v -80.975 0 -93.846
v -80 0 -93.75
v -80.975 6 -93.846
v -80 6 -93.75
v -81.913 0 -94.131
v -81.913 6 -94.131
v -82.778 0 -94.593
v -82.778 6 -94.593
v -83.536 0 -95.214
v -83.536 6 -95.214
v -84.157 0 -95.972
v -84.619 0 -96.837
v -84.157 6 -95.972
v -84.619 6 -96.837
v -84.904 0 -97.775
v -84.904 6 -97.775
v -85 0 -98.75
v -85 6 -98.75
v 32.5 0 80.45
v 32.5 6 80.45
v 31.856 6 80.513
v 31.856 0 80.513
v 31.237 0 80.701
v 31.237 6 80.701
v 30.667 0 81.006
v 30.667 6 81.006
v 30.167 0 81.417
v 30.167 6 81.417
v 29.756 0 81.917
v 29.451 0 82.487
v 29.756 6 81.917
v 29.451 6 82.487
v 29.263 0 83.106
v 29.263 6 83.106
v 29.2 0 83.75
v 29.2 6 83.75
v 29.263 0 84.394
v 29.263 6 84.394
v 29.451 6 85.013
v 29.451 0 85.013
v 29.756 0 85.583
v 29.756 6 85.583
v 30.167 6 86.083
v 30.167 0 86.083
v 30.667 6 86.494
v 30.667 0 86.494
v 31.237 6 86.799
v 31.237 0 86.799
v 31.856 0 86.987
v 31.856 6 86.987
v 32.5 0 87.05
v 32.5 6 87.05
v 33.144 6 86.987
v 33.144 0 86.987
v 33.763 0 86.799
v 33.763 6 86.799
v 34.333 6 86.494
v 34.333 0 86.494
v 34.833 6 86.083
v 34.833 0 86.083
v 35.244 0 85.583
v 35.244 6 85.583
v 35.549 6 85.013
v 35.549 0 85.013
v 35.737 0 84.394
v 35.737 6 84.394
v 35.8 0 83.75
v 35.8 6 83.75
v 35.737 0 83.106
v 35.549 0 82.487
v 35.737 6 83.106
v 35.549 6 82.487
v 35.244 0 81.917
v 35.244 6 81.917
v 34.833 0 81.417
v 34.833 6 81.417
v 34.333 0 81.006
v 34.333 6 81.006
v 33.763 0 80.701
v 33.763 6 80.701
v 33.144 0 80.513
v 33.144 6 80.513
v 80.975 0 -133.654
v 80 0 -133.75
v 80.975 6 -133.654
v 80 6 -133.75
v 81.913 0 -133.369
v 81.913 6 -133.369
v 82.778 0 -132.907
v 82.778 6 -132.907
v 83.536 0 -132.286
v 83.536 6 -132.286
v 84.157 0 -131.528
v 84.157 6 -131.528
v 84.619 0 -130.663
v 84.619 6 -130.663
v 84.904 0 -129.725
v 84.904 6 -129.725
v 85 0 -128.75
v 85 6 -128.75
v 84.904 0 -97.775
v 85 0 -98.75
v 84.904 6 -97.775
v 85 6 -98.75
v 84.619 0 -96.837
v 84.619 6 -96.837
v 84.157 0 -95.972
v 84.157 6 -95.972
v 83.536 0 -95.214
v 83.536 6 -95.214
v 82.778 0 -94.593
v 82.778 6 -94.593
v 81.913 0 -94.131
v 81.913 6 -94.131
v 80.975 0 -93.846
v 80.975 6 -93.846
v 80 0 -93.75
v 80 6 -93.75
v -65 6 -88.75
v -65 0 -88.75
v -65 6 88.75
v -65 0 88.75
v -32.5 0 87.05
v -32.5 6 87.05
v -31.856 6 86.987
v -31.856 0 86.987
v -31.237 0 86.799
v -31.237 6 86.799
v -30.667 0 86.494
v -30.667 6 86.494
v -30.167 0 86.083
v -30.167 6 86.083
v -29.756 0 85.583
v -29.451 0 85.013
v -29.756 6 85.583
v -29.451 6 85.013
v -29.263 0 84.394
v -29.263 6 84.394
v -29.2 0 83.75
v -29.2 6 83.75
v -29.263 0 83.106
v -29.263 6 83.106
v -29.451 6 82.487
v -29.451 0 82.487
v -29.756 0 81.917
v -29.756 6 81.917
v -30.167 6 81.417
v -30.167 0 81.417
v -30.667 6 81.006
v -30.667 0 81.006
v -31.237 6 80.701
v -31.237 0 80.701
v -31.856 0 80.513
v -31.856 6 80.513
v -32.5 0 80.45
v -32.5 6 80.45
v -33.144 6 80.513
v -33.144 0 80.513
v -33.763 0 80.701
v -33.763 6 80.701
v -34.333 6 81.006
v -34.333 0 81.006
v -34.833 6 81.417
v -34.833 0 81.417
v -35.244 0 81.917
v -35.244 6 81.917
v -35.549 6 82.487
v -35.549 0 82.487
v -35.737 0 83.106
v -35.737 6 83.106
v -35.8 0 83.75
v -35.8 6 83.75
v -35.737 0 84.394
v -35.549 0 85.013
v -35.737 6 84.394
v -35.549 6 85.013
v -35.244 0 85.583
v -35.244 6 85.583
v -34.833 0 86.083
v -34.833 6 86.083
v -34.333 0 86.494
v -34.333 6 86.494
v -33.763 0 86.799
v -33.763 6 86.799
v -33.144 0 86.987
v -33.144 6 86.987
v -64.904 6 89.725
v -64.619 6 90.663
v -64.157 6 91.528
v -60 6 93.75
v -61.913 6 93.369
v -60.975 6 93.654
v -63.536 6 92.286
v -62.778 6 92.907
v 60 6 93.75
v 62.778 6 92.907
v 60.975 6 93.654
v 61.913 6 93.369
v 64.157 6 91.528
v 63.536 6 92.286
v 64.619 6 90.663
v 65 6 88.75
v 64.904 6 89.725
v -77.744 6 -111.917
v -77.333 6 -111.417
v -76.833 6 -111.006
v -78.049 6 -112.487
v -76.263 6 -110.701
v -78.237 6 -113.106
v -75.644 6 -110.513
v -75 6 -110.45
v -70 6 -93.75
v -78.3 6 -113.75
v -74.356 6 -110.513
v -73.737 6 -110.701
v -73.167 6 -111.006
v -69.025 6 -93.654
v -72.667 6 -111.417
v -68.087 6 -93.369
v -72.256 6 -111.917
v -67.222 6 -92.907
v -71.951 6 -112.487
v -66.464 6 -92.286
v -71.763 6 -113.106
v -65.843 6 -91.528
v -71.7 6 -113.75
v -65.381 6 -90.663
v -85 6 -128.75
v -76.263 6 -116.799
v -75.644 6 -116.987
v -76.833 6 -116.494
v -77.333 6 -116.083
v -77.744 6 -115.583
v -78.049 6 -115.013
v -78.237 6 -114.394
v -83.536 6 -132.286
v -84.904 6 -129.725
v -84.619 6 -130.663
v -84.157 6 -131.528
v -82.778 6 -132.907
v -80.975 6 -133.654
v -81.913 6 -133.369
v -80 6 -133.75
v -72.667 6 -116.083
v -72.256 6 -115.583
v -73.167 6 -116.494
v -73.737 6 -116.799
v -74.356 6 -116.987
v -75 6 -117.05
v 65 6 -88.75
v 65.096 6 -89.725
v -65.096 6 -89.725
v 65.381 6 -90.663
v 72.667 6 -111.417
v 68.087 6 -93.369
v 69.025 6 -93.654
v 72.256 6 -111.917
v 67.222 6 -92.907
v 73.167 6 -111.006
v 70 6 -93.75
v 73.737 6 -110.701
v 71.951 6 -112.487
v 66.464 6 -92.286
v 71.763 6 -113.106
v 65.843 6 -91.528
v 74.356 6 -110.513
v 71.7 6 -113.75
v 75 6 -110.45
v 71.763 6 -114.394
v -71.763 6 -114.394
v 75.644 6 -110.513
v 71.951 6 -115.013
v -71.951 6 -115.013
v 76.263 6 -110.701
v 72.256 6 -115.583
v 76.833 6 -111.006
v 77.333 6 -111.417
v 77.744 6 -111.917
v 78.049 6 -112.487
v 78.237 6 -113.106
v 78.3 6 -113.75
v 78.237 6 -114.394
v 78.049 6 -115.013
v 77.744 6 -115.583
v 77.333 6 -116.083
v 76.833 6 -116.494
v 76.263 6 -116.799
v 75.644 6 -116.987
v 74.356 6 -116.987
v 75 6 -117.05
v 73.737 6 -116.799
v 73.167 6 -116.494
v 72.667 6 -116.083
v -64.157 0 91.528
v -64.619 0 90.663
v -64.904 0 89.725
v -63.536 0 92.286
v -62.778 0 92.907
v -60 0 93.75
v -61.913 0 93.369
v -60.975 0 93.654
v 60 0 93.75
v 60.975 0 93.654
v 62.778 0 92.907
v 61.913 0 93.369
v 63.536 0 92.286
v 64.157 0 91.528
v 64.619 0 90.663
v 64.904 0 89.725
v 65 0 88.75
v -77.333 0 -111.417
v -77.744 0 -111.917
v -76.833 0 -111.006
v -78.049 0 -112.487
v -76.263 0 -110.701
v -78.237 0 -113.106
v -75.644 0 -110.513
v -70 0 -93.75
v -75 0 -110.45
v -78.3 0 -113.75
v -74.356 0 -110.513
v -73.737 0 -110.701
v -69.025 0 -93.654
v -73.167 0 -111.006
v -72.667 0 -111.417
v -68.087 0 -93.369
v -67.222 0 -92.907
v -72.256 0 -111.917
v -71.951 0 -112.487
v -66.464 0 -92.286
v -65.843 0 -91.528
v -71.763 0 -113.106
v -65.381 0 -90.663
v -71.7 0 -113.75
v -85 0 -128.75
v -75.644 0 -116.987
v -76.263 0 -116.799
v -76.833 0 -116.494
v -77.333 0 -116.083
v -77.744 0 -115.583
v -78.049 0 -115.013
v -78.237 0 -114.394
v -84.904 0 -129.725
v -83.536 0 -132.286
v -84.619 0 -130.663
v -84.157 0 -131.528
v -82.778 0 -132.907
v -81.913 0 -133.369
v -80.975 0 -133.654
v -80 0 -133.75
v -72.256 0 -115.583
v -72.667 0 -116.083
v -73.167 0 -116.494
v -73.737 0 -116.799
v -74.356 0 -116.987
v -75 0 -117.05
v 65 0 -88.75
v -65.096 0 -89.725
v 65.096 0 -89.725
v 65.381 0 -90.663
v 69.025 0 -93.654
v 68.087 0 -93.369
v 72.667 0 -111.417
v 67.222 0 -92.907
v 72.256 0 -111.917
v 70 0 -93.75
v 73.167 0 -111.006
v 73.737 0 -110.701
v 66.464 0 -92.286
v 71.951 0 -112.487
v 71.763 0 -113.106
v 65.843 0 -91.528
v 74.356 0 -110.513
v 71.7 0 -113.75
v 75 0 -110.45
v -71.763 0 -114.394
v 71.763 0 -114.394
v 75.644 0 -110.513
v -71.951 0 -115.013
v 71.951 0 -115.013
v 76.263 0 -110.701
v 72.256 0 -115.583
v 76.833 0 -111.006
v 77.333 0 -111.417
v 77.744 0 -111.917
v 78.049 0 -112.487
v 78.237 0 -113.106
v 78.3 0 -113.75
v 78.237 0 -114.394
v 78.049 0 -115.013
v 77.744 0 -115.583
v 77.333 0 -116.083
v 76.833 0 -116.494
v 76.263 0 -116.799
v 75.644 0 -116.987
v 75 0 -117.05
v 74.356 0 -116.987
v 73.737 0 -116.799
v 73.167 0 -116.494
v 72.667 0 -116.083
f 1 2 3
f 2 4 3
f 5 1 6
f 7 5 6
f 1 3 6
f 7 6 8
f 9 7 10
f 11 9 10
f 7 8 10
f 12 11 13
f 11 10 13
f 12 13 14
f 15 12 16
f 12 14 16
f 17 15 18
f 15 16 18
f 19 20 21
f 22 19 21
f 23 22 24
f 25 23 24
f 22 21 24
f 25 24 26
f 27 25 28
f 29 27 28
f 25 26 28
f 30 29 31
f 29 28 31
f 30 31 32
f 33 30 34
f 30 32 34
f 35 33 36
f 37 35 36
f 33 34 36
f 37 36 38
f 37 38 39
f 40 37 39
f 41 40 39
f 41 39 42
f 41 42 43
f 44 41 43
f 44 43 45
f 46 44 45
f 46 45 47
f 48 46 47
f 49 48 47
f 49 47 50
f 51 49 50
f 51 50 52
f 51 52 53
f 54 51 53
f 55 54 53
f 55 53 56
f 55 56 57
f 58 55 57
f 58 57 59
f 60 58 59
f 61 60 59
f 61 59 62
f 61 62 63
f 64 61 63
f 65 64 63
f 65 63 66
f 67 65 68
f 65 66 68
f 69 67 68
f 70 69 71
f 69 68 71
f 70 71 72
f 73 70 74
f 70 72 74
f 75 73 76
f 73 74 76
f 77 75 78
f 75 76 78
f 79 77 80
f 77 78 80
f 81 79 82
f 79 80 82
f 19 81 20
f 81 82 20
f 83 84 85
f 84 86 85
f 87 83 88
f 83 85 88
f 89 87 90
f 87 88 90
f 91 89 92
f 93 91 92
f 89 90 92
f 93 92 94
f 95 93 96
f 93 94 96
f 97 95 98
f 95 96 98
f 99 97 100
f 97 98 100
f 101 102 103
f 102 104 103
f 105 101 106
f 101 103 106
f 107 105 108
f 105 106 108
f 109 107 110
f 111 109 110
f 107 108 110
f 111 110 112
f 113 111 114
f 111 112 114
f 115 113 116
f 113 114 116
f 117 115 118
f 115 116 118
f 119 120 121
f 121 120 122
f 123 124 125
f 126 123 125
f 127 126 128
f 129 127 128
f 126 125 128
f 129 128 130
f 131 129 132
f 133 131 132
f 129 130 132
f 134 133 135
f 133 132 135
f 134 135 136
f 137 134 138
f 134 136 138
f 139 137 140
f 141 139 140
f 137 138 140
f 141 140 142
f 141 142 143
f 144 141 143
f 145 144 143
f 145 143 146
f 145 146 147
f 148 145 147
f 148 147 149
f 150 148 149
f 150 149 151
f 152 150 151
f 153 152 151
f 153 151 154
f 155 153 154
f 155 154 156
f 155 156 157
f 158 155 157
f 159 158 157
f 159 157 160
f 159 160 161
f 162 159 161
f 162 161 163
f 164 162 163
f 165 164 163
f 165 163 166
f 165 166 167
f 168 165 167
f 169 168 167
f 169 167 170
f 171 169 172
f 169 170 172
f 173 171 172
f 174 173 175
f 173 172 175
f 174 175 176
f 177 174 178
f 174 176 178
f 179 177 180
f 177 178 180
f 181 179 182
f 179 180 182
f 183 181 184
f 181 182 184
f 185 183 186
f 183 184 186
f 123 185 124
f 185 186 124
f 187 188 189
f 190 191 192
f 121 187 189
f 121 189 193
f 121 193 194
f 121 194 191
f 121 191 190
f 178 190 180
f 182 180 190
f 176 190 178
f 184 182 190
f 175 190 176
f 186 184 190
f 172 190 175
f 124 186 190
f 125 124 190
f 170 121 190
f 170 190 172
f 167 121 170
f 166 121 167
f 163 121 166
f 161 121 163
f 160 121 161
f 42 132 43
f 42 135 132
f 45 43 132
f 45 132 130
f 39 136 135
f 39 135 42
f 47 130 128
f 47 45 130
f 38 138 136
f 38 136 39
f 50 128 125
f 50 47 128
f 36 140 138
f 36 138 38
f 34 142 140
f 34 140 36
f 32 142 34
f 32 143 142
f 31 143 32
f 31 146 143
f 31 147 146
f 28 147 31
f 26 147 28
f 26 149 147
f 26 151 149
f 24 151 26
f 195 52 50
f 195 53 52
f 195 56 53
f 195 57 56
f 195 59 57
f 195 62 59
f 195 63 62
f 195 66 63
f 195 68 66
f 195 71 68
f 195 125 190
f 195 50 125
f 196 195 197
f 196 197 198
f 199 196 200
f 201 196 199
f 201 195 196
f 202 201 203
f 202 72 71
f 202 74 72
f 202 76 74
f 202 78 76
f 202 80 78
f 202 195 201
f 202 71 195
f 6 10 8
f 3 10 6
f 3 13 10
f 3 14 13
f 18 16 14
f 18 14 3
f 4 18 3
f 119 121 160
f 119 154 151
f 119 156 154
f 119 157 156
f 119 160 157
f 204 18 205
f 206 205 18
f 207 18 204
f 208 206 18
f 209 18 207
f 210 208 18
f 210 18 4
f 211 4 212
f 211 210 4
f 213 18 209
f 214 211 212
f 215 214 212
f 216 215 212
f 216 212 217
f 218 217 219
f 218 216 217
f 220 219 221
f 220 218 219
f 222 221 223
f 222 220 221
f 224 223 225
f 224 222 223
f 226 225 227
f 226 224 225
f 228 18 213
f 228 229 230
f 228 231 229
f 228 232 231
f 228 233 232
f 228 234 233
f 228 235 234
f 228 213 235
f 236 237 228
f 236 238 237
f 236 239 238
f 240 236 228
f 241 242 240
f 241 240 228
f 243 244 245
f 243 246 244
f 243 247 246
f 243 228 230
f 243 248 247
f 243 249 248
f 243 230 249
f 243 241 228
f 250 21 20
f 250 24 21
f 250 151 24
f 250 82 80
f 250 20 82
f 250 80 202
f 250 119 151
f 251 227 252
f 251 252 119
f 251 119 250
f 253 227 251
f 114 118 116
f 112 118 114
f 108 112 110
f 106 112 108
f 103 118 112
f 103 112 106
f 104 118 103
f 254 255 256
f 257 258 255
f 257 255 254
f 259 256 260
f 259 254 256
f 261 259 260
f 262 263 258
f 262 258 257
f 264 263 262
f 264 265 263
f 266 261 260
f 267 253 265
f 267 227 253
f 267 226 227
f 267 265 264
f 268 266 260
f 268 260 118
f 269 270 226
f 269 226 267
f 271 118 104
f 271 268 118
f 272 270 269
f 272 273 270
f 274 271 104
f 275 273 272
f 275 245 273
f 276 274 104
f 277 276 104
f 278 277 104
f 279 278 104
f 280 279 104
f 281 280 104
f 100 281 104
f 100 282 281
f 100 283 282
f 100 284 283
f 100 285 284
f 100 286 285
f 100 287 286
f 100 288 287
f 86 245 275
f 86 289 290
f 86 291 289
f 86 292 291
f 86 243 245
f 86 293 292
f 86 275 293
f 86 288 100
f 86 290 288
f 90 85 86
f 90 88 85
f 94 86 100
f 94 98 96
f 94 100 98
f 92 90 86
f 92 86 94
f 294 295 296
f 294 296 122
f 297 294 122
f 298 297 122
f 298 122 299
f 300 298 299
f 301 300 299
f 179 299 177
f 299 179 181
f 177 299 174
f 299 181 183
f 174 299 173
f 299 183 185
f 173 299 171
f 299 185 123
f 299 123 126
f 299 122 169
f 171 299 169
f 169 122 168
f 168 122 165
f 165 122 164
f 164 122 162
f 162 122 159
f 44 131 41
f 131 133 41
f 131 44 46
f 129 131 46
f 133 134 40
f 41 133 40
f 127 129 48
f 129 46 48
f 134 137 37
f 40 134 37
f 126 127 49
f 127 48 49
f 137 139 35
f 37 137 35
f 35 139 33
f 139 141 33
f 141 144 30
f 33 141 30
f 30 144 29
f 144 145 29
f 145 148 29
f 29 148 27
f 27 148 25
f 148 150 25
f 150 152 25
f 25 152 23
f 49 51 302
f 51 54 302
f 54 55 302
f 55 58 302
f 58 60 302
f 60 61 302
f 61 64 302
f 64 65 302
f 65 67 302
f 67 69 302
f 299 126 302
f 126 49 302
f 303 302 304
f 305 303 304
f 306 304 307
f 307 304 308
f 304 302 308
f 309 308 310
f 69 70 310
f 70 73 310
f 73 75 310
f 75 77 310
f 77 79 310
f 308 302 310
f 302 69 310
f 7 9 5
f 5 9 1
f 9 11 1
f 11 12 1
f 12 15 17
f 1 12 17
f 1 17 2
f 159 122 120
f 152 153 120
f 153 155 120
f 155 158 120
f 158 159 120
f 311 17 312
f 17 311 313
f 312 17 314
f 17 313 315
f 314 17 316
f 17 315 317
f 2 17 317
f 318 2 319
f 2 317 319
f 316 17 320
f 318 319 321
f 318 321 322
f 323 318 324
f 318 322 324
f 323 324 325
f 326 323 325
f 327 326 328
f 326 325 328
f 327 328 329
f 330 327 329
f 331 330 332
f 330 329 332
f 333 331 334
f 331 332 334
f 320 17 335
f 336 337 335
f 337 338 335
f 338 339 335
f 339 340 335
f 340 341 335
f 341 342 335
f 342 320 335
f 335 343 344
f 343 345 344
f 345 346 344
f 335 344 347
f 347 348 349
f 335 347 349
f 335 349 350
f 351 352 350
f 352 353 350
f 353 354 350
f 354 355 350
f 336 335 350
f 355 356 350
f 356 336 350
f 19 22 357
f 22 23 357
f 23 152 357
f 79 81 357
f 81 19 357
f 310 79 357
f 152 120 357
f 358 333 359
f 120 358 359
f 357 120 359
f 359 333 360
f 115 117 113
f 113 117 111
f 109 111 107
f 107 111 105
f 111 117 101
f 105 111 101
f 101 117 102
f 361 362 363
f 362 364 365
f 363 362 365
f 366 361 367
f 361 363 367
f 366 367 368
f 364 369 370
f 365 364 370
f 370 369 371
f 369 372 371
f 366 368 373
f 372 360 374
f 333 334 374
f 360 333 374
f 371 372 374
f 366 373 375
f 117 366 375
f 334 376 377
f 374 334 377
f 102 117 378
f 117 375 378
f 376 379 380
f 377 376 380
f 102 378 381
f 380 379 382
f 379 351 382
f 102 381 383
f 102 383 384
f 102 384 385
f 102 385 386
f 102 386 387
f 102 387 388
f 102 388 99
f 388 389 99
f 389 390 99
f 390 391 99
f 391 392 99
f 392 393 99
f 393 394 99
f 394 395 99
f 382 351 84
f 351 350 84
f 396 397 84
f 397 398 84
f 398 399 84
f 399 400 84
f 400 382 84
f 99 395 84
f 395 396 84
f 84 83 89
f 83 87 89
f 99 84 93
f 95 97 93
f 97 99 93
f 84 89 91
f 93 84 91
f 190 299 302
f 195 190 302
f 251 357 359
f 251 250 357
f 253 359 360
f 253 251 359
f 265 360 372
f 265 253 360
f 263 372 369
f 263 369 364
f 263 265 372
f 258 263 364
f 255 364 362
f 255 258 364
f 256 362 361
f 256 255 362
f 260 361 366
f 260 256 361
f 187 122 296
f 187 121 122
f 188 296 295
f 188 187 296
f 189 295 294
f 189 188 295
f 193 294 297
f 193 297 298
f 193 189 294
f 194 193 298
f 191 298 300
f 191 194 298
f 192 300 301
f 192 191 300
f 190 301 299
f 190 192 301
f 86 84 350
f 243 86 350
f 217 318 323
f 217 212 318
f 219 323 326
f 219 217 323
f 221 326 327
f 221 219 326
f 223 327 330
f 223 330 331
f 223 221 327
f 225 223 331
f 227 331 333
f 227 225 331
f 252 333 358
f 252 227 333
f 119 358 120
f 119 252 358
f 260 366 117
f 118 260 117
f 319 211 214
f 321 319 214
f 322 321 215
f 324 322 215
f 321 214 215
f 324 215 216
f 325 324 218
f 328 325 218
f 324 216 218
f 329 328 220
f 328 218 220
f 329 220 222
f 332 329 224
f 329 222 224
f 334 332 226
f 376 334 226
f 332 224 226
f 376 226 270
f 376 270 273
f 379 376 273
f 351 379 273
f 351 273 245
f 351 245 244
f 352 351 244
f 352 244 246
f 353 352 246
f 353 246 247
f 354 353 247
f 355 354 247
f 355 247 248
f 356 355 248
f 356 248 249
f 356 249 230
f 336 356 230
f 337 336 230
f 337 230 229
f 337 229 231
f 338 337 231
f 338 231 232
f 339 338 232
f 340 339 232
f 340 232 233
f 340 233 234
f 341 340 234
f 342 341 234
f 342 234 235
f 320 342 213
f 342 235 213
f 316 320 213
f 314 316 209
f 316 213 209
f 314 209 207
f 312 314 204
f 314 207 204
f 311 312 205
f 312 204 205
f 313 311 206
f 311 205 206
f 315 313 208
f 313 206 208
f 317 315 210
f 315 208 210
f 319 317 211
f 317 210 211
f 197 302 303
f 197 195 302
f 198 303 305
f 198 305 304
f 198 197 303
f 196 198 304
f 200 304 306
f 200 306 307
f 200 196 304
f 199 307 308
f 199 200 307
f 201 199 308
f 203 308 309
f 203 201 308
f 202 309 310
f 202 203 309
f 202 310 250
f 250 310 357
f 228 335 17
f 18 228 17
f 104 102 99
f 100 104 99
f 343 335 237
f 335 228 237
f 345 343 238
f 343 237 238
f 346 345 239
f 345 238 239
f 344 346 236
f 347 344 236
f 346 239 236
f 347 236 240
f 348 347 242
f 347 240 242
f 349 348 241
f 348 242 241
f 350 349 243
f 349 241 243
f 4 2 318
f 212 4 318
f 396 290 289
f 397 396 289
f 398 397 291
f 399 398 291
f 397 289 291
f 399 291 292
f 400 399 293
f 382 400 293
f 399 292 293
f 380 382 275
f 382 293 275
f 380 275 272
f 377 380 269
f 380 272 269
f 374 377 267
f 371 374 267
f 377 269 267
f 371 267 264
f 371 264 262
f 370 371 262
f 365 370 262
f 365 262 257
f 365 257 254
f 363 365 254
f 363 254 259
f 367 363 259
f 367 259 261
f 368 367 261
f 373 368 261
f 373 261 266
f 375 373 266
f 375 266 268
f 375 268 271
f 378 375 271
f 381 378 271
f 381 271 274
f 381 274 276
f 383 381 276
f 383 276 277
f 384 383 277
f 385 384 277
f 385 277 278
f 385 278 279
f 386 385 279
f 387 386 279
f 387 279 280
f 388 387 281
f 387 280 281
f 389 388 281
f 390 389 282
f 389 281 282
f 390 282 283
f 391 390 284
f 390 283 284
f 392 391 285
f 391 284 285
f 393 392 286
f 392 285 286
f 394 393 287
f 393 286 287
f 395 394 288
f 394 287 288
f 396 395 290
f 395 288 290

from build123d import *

# Parameters (mm, degrees)
BOSS_EXTRUDE2_DEPTH = 6
SKETCH3_R           = 3.3
CUT_EXTRUDE1_DEPTH  = 159.587712323
FILLET1_R           = 5


with BuildPart() as part:
    # Sketch1 → Boss-Extrude2 (new body)
    with BuildSketch(Plane(origin=(0, 0, 0), x_dir=(1, 0, 0), z_dir=(0, 1, 0))):
        Polygon((-85, 93.75), (-65, 93.75), (-65, -93.75), (65, -93.75), (65, 93.75), (85, 93.75), (85, 133.75), (-85, 133.75), align=None)
    extrude(amount=BOSS_EXTRUDE2_DEPTH)

    # Sketch3 → Cut-Extrude1 (cut, through all)
    with BuildSketch(Plane(origin=(0, 6, 0), x_dir=(1, 0, 0), z_dir=(0, 1, 0))):
        with Locations(Location((-75, 113.75, 0), (0, 0, 270))):
            Circle(SKETCH3_R)
        with Locations(Location((-32.5, -83.75, 0), (0, 0, 270))):
            Circle(SKETCH3_R)
        with Locations(Location((75, 113.75, 0), (0, 0, 90))):
            Circle(SKETCH3_R)
        with Locations(Location((32.5, -83.75, 0), (0, 0, 90))):
            Circle(SKETCH3_R)
    extrude(amount=-CUT_EXTRUDE1_DEPTH, mode=Mode.SUBTRACT)

    # Fillet1
    fillet1_edges = [part.edges().sort_by_distance(p)[0] for p in [
        (65, 3, -93.75),
        (65, 3, 93.75),
        (-65, 3, 93.75),
        (-65, 3, -93.75),
        (-85, 3, -93.75),
        (-85, 3, -133.75),
        (85, 3, -133.75),
        (85, 3, -93.75),
    ]]
    fillet(fillet1_edges, radius=FILLET1_R)


solid = part.part
